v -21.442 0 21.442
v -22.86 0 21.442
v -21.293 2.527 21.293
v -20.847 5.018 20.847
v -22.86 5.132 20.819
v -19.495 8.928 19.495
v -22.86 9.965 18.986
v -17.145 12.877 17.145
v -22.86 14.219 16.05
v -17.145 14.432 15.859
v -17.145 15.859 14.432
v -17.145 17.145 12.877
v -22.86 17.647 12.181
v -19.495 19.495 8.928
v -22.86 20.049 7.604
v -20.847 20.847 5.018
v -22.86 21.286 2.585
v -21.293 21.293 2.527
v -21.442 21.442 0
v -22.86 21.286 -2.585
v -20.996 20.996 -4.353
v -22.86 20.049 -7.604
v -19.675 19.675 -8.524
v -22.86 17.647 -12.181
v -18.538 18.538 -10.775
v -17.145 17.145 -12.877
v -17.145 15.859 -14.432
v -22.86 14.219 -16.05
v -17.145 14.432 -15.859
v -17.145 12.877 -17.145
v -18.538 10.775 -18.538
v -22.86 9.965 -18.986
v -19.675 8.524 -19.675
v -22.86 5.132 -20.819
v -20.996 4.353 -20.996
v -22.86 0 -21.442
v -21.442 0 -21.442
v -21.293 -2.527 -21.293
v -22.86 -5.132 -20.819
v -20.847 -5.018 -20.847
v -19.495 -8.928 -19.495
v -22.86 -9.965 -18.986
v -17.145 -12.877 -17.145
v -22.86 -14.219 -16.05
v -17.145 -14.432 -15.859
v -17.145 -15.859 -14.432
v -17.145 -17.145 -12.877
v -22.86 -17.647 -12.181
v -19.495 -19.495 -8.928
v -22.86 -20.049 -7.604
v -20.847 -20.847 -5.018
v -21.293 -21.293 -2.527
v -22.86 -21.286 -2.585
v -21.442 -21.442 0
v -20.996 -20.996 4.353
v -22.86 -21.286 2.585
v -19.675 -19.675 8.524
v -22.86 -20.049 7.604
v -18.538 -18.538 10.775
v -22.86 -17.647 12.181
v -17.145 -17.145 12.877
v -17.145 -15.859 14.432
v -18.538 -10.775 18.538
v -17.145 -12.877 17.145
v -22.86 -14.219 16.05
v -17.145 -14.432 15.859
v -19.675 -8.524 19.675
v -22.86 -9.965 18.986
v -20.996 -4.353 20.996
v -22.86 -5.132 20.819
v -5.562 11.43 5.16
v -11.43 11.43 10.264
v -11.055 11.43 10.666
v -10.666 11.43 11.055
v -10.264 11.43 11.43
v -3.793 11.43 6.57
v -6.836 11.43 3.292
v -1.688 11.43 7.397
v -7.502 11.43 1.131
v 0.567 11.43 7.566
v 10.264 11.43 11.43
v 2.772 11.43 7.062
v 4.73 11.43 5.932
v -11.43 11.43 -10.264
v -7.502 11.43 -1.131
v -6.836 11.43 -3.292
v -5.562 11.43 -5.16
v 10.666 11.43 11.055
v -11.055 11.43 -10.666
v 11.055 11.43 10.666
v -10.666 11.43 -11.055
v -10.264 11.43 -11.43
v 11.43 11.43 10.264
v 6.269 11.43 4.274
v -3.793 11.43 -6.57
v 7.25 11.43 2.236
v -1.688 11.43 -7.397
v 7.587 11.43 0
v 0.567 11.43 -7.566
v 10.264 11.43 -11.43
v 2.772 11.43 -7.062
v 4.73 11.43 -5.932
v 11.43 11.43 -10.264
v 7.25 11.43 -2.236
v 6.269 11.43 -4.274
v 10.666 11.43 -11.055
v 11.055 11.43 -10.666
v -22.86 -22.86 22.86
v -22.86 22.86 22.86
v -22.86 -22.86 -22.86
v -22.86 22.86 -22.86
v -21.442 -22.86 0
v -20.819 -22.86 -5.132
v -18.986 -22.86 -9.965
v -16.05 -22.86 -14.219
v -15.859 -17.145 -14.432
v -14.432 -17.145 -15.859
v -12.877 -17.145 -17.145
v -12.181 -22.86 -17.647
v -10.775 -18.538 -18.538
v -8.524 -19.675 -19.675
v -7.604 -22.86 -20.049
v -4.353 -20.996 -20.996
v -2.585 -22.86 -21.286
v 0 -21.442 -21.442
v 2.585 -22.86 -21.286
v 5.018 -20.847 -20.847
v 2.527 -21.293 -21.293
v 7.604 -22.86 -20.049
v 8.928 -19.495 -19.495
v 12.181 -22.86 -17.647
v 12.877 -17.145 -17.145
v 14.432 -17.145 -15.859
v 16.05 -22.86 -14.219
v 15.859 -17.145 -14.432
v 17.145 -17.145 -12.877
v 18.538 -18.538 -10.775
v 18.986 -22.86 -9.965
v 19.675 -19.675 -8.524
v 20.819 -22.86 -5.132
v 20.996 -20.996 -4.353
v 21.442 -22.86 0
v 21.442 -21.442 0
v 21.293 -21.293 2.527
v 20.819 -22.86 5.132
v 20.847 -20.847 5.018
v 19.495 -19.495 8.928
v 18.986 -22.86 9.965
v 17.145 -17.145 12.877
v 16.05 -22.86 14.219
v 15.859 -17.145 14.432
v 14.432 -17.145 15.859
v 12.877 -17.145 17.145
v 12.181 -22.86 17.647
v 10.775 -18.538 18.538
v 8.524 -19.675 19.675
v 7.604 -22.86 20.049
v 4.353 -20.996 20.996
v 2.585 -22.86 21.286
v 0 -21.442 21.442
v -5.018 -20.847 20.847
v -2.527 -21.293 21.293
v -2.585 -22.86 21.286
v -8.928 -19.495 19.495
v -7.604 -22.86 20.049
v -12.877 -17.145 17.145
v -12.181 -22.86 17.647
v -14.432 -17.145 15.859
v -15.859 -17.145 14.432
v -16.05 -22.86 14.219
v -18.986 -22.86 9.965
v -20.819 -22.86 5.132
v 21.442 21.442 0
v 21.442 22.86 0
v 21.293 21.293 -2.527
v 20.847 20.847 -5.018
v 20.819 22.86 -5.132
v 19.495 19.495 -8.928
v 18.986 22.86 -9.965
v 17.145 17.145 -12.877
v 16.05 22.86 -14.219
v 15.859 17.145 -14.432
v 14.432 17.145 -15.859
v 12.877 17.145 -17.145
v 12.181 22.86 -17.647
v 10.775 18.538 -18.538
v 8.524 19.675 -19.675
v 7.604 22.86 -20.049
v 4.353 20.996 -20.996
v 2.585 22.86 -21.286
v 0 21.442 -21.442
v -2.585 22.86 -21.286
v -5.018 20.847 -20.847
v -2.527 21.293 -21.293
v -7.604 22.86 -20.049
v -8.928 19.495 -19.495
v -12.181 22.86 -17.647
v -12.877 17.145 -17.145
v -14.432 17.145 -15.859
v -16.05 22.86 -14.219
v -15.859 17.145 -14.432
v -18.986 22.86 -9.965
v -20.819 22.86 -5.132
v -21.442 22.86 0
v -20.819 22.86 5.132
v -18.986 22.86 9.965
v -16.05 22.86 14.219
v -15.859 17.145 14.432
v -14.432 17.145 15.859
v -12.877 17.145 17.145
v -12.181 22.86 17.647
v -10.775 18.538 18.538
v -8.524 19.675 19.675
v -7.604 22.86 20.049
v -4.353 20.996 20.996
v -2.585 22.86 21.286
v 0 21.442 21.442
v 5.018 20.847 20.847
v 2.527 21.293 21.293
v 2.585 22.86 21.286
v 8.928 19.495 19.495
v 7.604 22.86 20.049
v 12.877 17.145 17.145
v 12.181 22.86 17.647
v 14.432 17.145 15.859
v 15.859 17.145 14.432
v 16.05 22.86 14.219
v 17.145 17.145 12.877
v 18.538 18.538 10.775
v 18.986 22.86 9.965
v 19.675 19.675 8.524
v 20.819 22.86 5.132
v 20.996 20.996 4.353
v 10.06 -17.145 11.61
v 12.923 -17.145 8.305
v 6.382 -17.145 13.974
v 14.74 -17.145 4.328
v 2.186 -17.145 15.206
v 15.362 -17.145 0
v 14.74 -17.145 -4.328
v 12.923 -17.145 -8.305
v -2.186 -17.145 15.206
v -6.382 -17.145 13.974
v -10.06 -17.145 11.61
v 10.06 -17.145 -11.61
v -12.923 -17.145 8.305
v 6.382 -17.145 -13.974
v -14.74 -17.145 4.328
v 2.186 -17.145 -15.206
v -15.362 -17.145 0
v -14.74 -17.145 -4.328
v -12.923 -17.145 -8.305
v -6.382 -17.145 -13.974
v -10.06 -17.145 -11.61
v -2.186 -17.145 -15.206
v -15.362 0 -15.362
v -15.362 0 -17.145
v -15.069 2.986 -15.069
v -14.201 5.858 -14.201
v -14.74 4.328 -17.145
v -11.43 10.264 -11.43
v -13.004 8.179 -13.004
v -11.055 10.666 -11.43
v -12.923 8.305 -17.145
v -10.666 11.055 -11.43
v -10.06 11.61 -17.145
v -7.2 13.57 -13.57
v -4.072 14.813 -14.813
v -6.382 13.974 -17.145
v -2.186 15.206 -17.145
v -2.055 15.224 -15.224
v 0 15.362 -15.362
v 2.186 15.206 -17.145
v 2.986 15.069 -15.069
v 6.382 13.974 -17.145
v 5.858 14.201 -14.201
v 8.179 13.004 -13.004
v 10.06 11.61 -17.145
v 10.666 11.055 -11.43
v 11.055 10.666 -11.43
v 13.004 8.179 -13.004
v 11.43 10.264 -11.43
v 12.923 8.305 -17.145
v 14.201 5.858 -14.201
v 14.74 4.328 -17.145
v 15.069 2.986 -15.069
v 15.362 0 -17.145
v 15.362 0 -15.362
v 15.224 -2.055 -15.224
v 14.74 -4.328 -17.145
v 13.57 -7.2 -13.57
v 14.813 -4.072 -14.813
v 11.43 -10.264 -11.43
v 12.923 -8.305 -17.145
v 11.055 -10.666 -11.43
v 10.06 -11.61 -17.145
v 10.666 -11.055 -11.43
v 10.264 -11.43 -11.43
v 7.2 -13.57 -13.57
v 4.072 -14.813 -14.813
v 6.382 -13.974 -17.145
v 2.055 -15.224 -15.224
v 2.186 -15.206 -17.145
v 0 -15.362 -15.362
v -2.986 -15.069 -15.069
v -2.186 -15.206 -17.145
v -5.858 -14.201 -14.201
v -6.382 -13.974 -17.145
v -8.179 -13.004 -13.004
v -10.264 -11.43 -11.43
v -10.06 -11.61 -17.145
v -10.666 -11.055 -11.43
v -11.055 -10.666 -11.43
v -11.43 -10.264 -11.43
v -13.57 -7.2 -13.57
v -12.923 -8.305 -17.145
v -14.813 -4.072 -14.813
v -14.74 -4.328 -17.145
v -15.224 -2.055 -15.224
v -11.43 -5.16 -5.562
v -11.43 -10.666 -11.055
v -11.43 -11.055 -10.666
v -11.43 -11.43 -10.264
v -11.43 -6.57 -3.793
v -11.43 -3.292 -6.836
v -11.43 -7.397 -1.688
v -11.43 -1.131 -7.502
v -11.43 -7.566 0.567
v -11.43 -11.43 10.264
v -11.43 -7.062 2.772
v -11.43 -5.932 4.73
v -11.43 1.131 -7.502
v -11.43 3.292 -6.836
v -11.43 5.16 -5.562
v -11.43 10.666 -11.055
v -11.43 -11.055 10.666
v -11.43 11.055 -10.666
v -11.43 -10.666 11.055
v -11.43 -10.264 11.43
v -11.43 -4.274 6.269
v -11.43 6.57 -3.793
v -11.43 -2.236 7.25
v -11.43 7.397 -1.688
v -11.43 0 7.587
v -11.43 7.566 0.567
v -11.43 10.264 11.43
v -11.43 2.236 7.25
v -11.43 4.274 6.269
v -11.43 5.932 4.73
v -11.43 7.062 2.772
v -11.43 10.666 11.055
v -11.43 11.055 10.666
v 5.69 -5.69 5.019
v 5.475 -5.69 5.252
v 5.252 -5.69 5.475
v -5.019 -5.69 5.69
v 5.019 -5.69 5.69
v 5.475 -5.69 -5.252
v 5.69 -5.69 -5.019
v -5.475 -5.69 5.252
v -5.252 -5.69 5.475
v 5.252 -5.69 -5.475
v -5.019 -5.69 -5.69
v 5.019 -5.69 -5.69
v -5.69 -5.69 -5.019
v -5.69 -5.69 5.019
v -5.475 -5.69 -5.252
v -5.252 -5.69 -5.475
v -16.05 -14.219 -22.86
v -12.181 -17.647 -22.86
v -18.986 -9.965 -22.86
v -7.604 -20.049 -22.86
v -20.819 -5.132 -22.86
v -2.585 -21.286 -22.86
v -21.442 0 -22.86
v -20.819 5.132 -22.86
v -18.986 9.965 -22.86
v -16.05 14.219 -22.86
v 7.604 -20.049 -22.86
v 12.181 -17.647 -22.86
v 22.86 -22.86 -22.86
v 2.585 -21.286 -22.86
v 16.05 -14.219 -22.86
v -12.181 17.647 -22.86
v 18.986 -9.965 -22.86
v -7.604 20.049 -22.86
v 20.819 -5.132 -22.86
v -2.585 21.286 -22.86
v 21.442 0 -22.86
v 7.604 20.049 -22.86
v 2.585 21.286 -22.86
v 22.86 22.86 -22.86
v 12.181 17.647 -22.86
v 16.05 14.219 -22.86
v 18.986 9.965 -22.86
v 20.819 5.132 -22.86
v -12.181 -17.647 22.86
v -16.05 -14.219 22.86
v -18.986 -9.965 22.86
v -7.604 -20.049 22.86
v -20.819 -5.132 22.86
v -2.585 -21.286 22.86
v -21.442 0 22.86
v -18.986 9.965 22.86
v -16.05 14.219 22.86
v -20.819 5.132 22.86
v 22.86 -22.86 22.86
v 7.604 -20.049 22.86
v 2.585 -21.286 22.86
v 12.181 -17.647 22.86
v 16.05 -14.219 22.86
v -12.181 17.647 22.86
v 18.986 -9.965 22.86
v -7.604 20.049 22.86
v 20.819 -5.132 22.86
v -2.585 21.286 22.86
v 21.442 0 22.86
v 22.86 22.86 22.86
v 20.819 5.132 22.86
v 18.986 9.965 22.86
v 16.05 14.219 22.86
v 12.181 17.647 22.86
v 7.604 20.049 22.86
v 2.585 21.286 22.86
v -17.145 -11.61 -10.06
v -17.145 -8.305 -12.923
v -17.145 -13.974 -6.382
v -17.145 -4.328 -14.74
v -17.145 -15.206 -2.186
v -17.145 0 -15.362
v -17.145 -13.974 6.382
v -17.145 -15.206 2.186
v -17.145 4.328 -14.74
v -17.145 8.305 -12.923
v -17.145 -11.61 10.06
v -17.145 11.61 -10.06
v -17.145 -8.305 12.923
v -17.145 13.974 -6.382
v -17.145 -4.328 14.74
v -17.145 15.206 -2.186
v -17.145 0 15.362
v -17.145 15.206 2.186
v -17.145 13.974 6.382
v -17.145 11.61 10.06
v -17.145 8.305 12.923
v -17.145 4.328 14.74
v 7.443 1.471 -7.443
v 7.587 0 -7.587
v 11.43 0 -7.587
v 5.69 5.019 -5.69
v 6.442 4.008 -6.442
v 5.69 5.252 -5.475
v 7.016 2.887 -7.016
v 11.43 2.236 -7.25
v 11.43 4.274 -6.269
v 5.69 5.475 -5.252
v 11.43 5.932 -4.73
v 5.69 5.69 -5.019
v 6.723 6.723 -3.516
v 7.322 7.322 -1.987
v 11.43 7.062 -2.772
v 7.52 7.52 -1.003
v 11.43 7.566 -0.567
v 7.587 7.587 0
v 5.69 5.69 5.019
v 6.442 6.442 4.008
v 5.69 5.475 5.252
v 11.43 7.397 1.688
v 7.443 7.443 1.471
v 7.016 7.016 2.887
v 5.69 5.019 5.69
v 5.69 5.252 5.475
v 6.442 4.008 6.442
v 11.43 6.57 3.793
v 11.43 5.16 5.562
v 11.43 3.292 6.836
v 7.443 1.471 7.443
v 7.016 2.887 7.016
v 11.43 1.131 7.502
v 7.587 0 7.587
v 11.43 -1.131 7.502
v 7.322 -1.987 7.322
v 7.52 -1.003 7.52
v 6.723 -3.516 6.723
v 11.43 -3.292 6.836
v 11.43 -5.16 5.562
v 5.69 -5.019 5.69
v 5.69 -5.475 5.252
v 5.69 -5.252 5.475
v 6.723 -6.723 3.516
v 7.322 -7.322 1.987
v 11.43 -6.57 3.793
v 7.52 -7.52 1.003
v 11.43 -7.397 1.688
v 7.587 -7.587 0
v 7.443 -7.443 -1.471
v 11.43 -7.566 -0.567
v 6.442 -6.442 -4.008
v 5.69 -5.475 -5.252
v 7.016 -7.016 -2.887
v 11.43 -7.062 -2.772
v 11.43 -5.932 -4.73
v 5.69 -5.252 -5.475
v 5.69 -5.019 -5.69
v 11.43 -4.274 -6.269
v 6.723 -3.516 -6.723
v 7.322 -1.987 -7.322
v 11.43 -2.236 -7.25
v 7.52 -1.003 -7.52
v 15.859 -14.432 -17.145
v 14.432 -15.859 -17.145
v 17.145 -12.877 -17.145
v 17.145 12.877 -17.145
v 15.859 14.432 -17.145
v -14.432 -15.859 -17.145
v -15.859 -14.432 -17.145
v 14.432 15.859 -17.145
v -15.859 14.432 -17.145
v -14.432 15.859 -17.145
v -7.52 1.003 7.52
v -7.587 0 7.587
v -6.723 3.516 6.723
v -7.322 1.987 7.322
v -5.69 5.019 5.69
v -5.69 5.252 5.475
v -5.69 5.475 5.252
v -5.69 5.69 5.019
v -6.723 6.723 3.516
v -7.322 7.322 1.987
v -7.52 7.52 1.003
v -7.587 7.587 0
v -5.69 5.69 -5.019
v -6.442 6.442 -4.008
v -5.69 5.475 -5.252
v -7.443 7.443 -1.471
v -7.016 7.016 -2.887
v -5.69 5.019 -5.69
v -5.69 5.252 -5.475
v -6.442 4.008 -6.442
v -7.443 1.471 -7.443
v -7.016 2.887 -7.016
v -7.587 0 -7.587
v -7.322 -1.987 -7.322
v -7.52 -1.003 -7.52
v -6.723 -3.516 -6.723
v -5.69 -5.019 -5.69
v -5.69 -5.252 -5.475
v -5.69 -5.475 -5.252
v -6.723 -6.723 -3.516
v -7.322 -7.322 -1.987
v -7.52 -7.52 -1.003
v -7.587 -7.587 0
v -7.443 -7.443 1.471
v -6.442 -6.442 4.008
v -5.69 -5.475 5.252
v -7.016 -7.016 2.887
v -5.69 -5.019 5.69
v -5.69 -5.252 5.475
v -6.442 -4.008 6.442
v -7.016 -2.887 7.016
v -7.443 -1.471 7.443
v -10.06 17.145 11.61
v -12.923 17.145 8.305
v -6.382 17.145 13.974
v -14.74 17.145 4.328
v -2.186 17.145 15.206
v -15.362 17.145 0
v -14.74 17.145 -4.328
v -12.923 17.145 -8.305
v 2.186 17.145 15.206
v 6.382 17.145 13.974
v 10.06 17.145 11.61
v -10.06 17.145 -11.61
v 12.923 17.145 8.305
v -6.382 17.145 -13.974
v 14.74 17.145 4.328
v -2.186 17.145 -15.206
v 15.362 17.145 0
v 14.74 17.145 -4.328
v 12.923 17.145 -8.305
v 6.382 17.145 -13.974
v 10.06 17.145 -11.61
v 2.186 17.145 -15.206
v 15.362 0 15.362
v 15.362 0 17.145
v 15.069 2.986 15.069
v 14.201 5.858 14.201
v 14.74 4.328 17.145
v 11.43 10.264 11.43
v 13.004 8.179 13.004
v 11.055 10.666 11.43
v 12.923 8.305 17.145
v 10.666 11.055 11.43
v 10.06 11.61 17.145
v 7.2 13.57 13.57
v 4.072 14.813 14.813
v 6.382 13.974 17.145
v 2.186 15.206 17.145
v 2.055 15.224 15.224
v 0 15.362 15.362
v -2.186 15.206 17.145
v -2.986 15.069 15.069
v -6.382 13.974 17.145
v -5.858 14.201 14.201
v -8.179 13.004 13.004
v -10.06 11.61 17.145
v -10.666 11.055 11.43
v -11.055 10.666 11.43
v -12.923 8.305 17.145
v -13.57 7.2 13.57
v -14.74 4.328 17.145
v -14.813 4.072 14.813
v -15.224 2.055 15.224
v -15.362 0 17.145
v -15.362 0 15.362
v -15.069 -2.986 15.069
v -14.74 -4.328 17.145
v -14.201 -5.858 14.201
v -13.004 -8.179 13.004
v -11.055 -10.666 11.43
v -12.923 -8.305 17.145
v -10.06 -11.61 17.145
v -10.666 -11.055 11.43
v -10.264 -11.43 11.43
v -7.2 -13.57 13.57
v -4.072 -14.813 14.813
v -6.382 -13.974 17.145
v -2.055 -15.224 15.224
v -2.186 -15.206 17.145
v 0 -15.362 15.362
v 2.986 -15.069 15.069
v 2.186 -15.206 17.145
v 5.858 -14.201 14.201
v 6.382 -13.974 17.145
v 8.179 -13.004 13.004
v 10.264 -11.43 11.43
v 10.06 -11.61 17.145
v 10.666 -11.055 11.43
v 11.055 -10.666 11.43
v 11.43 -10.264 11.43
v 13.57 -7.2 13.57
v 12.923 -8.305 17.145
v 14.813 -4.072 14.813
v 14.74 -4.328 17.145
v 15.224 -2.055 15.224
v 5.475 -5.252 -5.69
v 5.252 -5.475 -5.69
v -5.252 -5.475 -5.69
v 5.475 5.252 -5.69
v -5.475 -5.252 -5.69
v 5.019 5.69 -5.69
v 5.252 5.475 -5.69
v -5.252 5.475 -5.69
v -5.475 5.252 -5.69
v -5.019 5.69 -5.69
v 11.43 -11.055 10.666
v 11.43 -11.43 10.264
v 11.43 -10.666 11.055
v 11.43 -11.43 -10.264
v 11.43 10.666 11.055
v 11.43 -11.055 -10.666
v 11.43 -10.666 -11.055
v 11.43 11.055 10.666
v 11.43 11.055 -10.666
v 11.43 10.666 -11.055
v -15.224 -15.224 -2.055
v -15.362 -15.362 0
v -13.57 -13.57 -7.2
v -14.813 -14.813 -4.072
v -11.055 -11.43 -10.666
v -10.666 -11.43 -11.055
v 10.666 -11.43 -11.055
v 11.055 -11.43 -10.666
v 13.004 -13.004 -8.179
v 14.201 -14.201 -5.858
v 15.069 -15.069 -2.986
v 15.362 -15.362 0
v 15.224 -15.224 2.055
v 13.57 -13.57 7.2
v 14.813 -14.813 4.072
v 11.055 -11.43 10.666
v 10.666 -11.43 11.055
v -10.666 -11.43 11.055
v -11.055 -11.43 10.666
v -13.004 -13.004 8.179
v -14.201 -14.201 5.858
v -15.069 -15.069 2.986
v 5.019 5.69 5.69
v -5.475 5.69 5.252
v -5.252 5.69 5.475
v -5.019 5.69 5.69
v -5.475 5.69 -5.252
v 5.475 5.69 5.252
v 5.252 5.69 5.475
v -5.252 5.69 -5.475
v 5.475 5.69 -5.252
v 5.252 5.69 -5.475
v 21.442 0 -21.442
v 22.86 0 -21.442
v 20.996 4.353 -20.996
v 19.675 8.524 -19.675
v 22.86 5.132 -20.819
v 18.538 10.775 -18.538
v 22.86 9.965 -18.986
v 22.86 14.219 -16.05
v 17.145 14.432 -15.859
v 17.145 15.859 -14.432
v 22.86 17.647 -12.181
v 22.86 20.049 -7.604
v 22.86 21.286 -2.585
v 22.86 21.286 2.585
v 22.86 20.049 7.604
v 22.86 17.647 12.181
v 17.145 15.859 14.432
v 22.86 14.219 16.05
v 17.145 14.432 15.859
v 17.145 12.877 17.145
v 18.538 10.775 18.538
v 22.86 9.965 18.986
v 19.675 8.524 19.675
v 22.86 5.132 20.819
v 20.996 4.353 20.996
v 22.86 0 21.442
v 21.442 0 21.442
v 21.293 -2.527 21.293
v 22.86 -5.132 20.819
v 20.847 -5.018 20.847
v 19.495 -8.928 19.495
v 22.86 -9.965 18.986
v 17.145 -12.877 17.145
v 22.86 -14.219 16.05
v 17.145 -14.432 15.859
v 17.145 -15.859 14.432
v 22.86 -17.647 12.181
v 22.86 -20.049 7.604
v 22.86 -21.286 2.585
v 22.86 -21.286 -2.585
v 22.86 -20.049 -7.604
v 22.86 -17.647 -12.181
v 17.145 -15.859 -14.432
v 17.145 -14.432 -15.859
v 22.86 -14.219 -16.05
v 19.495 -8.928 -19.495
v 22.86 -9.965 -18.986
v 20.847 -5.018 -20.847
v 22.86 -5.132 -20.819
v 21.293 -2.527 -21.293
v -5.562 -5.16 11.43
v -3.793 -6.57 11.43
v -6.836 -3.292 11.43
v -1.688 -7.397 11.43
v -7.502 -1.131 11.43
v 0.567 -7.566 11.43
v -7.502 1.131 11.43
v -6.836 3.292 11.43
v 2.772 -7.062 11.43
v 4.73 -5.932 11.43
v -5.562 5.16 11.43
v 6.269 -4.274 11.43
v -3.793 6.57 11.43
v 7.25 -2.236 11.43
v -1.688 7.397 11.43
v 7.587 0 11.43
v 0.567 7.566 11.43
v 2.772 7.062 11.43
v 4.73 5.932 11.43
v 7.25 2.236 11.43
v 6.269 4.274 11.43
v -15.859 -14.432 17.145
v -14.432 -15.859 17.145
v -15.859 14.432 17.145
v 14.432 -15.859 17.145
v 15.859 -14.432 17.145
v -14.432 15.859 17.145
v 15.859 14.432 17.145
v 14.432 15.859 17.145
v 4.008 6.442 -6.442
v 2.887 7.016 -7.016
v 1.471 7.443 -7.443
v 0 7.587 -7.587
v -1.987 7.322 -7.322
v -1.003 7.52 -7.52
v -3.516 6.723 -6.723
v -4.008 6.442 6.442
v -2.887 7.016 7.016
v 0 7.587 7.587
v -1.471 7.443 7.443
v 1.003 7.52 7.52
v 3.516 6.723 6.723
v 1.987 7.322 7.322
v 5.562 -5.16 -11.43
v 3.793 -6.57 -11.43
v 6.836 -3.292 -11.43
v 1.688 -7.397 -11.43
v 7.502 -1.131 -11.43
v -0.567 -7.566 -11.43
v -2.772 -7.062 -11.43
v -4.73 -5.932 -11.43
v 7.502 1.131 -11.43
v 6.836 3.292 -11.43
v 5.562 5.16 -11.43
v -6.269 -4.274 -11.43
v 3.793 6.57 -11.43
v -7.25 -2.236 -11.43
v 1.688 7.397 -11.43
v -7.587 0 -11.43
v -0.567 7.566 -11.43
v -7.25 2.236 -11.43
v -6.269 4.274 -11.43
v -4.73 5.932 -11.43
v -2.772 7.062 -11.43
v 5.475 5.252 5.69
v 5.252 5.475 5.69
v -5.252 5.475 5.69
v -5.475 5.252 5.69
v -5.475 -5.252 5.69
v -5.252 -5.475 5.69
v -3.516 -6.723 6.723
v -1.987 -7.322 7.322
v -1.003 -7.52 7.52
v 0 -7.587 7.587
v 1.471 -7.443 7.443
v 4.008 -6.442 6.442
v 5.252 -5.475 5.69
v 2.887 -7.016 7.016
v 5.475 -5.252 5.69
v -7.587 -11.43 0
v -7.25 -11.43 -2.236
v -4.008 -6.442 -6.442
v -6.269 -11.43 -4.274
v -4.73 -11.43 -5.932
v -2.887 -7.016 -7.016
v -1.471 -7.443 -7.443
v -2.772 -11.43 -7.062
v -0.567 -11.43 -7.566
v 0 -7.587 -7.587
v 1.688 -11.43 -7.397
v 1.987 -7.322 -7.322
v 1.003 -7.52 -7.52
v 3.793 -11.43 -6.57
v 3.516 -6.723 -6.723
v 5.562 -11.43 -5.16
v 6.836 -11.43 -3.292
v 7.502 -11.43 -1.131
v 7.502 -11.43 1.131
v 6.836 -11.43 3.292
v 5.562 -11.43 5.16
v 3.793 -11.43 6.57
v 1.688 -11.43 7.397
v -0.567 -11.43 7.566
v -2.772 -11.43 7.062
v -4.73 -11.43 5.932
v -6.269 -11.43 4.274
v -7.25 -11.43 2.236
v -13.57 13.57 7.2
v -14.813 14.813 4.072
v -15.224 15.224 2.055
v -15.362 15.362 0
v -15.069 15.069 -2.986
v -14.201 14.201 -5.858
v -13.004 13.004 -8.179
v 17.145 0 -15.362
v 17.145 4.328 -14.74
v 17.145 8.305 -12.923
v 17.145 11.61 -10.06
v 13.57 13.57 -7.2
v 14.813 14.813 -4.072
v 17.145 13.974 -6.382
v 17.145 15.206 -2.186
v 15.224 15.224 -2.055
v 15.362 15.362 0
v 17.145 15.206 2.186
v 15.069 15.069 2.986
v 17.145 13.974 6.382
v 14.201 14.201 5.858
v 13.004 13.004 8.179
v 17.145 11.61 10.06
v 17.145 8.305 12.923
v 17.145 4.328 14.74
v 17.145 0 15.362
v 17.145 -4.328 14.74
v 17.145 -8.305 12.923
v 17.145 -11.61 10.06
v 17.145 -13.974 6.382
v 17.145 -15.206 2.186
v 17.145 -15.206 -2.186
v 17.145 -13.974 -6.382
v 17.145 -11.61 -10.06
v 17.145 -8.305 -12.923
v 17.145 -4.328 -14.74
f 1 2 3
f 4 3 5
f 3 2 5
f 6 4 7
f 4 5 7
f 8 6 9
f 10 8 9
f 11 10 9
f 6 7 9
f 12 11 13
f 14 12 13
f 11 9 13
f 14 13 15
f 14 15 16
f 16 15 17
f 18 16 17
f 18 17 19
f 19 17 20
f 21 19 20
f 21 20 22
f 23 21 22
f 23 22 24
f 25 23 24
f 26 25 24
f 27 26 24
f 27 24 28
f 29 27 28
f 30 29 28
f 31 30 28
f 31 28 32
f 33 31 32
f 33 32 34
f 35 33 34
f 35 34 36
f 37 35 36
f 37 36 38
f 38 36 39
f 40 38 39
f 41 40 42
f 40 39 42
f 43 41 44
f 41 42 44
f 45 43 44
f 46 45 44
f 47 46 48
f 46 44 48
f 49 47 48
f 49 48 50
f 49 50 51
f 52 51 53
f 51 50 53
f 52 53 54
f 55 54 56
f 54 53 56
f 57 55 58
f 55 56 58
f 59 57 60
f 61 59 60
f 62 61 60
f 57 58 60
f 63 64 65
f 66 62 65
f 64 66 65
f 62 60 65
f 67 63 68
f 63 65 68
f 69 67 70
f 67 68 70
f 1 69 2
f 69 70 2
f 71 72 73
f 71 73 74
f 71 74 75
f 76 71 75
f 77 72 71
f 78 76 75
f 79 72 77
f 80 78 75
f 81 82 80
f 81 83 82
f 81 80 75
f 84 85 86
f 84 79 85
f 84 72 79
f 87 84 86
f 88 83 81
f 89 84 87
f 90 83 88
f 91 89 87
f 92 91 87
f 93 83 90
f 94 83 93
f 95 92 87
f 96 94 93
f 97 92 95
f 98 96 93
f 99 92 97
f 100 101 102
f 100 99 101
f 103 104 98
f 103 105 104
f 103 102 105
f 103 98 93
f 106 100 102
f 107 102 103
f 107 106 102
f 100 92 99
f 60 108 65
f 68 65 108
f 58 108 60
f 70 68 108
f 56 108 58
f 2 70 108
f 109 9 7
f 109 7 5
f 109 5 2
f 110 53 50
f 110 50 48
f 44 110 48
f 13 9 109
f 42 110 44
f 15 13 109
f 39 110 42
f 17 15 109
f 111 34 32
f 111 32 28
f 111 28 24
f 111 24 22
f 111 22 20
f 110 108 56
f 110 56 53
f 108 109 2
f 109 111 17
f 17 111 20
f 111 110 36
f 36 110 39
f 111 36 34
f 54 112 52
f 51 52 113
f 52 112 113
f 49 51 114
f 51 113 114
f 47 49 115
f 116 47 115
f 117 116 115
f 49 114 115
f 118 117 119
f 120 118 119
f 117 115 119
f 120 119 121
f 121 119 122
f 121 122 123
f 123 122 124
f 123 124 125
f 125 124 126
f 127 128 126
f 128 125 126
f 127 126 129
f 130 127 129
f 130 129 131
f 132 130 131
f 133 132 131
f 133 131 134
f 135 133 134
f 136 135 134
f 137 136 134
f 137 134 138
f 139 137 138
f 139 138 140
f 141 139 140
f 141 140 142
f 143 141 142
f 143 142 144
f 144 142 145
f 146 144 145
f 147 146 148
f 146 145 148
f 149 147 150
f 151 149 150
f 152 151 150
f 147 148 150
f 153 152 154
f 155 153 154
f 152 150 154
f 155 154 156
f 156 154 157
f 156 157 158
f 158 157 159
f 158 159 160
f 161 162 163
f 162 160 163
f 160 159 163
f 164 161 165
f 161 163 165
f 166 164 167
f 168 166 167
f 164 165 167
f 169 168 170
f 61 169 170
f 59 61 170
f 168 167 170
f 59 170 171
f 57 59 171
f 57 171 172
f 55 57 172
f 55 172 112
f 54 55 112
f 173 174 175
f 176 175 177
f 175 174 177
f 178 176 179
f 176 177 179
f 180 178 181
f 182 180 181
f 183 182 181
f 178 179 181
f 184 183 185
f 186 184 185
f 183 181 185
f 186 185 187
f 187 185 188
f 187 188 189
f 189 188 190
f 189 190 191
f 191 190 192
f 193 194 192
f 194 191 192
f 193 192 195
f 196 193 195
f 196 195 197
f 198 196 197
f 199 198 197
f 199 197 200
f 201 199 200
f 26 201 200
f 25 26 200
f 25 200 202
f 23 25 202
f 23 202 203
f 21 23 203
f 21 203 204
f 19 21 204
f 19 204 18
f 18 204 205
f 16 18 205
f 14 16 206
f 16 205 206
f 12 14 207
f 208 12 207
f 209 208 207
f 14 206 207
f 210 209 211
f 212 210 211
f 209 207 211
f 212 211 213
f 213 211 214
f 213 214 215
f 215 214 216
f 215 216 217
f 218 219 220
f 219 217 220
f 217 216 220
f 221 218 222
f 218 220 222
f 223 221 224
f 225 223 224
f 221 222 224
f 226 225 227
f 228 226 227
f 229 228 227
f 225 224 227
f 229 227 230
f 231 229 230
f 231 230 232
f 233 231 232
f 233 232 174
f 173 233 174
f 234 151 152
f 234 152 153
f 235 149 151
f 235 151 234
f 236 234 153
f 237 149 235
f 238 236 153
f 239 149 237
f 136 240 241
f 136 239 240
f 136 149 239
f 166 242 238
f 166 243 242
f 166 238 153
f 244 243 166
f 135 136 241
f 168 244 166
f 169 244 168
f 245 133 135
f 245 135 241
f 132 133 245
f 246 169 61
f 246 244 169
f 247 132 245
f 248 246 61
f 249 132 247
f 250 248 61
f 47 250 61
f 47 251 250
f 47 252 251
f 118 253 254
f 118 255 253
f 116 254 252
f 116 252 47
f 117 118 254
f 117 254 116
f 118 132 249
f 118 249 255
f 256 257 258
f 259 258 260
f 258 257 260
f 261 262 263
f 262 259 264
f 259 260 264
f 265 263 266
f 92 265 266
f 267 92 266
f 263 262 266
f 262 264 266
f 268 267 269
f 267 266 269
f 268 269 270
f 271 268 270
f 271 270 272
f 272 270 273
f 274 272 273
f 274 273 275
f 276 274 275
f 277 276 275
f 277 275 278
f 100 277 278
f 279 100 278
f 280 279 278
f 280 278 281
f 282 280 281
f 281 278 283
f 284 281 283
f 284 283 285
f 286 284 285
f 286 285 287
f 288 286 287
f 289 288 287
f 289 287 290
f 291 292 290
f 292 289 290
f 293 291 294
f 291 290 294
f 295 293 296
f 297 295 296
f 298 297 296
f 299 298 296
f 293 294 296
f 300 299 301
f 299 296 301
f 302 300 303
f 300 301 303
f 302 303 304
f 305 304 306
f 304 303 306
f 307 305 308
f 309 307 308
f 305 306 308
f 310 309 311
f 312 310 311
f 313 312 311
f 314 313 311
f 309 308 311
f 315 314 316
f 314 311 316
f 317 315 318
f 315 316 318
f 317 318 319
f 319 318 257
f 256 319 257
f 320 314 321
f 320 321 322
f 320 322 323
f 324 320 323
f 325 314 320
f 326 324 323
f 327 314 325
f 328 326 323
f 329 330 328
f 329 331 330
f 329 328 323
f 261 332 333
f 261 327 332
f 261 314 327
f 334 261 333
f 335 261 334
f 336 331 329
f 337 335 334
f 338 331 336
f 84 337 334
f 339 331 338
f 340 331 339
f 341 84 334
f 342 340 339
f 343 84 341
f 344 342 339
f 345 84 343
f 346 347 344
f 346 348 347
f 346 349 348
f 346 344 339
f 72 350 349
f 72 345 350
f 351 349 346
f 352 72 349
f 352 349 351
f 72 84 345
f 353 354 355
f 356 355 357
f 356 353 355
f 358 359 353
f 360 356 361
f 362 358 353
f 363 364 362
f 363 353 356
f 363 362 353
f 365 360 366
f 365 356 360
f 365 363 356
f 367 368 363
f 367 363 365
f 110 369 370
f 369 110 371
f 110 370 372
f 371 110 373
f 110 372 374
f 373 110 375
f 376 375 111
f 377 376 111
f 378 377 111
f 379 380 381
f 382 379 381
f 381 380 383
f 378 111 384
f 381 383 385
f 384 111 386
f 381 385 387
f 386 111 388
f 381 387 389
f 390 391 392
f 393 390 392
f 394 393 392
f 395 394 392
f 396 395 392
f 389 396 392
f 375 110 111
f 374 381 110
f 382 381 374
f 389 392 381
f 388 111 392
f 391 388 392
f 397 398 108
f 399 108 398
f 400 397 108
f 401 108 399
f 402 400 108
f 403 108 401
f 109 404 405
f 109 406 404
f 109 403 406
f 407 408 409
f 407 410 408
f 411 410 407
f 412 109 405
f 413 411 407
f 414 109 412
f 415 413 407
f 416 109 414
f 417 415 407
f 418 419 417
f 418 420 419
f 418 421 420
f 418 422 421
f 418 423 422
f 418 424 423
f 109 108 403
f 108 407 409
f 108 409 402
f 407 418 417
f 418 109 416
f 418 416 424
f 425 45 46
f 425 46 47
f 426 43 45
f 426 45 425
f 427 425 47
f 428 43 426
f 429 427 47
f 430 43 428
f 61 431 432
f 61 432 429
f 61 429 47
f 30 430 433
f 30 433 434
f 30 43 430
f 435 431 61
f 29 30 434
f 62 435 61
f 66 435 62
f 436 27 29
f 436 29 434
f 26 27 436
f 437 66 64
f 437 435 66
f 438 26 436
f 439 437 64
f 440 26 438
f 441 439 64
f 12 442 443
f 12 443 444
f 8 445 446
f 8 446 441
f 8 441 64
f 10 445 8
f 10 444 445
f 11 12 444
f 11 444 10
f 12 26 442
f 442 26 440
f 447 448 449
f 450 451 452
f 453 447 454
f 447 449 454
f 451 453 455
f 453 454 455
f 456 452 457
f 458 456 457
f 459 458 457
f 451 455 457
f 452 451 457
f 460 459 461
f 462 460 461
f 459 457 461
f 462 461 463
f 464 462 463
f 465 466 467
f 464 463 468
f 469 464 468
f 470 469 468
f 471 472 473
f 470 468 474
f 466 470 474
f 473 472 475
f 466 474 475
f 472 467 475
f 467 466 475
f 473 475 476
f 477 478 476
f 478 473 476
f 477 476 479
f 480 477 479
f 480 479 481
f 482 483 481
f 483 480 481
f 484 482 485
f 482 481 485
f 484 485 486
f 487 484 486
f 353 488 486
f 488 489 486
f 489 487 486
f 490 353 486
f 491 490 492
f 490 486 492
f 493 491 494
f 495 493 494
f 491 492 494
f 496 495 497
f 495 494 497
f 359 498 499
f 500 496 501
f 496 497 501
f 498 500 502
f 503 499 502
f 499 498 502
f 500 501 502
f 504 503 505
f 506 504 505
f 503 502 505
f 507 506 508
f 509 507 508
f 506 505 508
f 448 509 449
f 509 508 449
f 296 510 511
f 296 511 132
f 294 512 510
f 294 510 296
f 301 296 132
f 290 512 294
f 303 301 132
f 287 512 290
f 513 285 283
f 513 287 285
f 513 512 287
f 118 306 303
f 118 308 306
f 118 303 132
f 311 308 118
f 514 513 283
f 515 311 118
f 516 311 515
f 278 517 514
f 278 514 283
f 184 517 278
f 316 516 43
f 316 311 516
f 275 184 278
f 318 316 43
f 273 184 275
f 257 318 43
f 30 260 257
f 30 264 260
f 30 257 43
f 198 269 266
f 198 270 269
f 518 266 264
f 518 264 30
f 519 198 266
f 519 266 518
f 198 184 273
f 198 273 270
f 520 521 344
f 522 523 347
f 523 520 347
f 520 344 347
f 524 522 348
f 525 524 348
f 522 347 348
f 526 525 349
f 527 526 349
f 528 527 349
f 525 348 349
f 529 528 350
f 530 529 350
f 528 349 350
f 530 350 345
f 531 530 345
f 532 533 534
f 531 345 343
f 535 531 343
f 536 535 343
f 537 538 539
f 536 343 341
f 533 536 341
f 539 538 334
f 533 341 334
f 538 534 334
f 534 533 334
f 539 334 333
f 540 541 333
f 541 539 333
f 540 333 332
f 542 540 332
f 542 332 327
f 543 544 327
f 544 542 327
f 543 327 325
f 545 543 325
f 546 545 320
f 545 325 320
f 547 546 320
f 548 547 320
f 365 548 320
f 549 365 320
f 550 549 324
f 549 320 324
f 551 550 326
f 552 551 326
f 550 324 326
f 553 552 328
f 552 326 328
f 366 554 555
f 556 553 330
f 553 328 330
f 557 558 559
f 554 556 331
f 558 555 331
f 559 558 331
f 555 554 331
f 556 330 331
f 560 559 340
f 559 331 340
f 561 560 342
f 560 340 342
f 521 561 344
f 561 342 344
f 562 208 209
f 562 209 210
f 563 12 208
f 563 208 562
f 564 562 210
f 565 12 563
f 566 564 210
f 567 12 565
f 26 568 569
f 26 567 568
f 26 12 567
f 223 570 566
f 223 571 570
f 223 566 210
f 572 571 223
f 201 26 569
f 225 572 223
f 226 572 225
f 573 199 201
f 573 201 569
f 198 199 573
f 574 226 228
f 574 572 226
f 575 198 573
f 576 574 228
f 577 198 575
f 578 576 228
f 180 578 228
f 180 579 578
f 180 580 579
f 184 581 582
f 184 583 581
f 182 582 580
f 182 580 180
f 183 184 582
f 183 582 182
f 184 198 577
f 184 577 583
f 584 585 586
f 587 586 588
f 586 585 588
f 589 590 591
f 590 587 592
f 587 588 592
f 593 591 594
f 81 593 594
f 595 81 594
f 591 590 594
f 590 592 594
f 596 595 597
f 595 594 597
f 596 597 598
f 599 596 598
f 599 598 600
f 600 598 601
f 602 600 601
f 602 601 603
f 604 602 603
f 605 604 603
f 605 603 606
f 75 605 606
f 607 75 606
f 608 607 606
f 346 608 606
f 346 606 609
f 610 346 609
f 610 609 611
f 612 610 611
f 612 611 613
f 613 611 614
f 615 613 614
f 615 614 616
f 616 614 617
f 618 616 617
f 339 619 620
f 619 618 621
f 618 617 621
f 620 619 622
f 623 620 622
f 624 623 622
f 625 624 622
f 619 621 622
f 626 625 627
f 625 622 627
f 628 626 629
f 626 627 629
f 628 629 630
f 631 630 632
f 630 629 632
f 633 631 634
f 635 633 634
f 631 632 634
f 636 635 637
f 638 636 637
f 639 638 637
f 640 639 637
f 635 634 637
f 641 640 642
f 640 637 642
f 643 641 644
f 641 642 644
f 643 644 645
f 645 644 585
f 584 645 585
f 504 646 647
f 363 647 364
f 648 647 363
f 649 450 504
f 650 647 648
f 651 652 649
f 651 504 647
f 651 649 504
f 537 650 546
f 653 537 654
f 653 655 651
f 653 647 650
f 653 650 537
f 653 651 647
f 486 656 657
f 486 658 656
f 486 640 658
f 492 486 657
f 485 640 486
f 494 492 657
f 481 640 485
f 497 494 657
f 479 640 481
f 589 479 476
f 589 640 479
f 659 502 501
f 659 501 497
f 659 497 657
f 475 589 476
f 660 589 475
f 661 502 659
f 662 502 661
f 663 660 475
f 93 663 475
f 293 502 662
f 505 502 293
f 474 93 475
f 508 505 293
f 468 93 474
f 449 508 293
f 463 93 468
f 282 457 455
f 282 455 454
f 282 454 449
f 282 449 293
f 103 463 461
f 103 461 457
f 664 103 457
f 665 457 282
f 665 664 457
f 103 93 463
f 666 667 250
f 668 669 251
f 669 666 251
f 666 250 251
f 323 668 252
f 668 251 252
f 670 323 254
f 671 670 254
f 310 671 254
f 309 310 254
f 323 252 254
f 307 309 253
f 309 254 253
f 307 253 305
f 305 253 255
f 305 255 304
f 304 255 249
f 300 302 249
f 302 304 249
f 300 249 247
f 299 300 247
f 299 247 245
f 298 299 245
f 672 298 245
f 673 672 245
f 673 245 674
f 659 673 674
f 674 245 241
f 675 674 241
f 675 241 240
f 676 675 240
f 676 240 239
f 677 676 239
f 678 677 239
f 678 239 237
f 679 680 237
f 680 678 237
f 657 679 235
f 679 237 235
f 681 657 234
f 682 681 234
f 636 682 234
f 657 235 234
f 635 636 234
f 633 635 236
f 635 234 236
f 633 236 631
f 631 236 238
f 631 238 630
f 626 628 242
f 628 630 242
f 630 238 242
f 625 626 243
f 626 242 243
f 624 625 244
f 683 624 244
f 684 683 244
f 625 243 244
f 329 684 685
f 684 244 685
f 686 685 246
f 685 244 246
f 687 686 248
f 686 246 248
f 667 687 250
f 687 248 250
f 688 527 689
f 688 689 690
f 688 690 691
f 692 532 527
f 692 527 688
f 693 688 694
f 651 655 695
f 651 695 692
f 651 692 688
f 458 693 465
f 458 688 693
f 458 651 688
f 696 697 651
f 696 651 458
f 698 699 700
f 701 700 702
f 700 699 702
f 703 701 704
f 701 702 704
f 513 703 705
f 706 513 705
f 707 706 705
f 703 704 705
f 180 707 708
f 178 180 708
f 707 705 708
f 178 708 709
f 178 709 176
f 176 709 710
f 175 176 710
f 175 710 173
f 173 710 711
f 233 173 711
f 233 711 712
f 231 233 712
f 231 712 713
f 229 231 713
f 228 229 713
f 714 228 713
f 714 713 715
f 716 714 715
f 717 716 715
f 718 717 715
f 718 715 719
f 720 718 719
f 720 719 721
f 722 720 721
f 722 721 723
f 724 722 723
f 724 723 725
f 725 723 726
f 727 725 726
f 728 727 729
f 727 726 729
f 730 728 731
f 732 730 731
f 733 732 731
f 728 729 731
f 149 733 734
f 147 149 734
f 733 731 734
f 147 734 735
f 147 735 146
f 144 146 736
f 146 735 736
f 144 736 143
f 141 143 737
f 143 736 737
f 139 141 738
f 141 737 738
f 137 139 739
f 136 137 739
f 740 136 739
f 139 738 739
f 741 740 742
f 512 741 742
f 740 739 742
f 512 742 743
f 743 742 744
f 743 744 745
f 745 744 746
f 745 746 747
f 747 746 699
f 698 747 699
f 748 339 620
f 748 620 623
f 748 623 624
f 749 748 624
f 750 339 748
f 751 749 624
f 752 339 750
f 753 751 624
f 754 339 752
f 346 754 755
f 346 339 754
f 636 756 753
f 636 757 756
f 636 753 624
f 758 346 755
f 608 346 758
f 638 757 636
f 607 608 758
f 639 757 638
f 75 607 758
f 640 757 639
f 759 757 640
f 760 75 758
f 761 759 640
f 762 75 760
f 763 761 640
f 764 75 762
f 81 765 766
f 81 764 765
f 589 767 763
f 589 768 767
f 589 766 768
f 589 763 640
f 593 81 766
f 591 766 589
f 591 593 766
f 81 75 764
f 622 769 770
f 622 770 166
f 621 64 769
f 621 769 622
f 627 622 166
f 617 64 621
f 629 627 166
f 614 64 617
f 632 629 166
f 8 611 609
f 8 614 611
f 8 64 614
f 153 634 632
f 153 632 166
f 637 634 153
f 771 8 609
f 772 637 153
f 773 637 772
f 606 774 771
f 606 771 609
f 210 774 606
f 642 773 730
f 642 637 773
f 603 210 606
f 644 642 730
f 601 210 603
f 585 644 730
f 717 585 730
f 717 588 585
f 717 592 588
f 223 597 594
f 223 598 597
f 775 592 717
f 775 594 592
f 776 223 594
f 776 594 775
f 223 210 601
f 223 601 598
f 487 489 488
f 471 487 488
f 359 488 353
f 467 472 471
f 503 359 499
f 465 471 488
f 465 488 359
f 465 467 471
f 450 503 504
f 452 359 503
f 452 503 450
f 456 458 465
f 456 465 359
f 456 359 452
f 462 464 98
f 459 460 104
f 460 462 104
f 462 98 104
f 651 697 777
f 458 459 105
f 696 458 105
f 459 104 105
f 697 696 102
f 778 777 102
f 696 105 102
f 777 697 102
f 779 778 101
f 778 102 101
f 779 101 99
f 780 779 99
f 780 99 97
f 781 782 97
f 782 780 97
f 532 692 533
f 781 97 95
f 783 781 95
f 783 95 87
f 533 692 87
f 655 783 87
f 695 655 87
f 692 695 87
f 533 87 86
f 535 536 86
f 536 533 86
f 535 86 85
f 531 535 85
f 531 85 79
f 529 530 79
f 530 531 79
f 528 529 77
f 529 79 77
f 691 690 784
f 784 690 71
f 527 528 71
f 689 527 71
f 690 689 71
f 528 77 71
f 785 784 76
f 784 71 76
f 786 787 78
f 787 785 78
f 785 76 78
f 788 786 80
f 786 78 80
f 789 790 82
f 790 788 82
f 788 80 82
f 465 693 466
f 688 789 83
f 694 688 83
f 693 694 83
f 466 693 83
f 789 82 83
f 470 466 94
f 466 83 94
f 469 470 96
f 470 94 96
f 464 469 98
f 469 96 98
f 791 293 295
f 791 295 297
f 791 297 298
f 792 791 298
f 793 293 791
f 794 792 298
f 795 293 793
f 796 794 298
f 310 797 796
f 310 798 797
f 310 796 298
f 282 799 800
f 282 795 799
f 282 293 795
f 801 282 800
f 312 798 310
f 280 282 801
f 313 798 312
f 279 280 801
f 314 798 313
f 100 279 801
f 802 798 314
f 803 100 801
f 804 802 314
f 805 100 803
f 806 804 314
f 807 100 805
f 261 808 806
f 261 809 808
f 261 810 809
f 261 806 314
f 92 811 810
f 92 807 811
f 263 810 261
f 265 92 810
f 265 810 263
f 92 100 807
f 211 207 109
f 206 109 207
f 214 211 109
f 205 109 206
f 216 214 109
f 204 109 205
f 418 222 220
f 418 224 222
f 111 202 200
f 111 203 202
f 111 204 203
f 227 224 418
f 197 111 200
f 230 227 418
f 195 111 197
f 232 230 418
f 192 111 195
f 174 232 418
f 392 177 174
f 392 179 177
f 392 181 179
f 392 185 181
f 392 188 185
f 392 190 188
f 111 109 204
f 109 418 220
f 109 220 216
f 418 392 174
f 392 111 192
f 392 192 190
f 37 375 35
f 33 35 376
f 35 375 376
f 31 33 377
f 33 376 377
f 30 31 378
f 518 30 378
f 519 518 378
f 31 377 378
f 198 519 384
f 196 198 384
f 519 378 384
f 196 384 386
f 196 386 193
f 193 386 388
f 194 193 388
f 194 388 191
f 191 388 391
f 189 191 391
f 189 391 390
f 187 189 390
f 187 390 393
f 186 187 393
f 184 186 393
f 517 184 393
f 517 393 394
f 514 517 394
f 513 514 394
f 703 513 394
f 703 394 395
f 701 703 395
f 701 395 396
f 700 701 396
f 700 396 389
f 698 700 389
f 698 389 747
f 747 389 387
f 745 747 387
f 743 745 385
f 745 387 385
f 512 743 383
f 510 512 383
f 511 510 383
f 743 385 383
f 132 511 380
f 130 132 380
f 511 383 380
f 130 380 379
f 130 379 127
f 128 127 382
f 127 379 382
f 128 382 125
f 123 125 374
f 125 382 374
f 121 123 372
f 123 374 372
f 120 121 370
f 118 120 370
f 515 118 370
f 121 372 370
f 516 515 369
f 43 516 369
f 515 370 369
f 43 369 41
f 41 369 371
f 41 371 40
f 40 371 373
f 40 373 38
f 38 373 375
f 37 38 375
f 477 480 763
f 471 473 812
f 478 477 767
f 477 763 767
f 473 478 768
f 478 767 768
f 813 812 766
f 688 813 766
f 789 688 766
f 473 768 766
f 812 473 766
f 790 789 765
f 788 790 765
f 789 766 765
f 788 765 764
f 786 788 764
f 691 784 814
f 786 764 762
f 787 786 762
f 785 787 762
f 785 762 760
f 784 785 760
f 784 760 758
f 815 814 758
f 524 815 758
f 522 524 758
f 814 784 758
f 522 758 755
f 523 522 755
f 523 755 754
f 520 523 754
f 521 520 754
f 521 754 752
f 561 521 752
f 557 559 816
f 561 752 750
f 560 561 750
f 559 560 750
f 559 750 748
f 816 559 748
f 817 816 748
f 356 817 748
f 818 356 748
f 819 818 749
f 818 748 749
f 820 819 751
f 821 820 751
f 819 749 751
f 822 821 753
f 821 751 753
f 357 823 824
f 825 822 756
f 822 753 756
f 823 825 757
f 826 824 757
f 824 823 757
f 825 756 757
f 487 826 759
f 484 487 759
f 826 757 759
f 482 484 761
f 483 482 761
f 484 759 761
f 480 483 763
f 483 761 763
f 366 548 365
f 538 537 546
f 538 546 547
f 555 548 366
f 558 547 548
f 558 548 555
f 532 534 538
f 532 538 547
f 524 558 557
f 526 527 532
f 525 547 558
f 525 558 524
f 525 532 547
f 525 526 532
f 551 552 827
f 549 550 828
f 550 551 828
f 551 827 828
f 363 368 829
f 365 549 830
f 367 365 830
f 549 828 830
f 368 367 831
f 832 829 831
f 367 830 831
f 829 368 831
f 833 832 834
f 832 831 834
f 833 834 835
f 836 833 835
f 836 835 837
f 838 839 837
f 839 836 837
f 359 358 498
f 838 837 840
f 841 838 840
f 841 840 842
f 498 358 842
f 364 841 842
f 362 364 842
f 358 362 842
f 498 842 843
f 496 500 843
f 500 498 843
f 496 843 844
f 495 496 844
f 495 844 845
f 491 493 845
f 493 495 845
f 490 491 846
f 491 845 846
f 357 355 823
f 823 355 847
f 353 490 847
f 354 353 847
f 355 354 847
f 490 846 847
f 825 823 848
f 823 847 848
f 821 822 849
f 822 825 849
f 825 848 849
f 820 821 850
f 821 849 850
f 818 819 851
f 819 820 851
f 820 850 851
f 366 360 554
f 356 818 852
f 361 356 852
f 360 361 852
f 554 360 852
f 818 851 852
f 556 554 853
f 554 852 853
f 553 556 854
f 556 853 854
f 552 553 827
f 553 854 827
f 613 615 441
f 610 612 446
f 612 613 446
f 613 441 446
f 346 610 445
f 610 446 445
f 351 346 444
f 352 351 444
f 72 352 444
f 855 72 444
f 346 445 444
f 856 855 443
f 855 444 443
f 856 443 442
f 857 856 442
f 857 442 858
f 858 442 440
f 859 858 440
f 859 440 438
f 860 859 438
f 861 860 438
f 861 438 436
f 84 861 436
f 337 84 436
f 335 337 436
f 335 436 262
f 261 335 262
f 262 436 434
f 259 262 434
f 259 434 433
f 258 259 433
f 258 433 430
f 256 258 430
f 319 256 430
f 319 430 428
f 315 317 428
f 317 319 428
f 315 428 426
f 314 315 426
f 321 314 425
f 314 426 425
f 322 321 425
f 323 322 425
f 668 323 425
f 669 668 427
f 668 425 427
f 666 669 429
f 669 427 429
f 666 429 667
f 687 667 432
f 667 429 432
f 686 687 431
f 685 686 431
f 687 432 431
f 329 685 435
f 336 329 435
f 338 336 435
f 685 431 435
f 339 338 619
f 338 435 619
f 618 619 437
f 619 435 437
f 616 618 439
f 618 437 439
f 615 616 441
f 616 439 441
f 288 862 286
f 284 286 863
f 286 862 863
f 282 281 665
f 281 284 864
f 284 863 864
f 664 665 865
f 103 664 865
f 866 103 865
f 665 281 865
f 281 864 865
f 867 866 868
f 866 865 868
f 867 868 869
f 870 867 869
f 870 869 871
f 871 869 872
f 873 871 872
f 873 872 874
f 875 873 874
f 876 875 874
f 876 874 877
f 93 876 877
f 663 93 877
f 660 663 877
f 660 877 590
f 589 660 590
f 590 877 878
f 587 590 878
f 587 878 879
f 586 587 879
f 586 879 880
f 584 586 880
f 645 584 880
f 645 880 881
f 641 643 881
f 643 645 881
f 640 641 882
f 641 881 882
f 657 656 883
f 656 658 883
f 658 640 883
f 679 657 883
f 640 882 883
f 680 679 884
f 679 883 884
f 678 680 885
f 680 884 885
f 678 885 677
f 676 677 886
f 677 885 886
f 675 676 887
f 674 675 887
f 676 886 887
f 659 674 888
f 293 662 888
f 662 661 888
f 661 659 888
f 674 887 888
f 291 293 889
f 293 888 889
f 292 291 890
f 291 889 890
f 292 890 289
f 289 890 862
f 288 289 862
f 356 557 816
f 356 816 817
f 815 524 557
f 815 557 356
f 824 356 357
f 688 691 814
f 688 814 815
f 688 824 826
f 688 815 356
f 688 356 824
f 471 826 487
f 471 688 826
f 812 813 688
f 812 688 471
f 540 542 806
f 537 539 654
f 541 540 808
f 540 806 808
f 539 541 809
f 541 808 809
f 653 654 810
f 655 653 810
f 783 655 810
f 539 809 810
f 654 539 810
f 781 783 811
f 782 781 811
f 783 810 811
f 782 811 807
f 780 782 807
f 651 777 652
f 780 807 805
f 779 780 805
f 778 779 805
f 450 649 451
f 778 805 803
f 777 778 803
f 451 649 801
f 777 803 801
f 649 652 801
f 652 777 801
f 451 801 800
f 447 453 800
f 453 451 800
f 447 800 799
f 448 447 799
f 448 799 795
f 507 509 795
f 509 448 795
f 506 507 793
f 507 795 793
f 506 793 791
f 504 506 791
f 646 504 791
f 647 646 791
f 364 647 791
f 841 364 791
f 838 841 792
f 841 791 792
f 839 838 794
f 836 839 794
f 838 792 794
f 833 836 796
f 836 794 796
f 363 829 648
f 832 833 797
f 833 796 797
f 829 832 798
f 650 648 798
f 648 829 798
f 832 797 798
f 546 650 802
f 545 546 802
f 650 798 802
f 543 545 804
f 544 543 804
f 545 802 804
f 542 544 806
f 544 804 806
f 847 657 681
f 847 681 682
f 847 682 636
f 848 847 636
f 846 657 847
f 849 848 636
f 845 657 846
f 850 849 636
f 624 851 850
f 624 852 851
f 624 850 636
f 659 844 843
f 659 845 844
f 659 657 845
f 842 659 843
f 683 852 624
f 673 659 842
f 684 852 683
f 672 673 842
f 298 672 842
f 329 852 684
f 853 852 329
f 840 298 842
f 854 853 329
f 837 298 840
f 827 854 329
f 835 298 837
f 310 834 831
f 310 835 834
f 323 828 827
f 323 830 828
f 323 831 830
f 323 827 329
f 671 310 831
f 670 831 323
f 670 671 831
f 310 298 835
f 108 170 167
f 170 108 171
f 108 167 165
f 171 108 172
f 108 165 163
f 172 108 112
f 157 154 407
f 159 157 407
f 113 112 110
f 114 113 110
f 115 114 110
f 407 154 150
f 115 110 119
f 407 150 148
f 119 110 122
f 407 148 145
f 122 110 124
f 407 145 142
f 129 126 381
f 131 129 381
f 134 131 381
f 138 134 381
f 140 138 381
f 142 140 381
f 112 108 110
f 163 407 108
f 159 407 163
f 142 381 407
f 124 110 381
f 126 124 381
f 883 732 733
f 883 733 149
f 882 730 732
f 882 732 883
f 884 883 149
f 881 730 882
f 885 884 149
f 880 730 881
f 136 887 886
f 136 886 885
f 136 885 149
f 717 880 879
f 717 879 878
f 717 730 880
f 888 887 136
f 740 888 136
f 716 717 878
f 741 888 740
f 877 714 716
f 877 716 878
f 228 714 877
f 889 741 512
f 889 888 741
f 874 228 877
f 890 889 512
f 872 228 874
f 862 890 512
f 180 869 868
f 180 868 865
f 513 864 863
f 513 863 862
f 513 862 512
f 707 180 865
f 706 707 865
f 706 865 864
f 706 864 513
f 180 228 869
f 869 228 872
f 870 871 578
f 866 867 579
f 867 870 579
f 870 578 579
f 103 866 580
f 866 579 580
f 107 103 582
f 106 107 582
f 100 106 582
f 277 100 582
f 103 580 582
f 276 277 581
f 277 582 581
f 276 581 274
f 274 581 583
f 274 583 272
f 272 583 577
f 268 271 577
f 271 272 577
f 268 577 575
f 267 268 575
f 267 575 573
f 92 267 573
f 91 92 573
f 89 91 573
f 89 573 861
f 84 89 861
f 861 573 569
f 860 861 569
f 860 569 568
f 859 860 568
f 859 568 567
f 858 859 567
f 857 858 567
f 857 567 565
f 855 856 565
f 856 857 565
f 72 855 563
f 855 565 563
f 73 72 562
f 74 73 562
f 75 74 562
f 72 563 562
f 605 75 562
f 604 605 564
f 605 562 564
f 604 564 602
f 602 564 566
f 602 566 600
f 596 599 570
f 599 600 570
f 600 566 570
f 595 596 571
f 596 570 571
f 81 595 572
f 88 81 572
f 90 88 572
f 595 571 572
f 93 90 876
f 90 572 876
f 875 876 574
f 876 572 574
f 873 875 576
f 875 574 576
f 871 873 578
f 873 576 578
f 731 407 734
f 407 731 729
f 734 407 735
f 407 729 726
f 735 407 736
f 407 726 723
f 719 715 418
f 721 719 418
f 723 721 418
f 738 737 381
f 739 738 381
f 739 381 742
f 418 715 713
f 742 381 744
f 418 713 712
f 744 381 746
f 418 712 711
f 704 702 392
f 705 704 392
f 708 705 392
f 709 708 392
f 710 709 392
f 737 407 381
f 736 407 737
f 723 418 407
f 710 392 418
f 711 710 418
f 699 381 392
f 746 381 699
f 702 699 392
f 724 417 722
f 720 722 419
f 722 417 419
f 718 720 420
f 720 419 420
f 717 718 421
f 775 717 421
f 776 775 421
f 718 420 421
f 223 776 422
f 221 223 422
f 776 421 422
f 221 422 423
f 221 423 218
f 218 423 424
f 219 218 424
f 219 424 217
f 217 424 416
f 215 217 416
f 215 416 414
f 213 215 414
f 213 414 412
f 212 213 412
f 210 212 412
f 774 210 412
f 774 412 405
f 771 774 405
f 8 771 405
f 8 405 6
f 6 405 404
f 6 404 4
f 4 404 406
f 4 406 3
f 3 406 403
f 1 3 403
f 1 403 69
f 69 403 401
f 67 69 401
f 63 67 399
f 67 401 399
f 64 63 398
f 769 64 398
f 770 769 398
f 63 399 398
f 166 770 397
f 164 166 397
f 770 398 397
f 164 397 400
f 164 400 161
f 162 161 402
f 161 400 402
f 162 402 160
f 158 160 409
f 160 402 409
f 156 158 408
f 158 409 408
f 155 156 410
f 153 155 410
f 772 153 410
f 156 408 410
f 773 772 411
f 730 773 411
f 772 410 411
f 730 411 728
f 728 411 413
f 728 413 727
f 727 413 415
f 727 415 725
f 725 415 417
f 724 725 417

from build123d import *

# Parameters (mm, degrees)
BOSS_EXTRUDE1_DEPTH          = 22.86
BOSS_EXTRUDE1_DEPTH_BACK     = 22.86
SKETCH1_W                    = 45.72
SKETCH1_H                    = 45.72
SKETCH4_R                    = 7.586926628
CUT_EXTRUDE1_DEPTH           = 17.1704
SKETCH5_R                    = 21.442420376
CUT_EXTRUDE2_DEPTH           = 5.715
SKETCH6_R                    = 15.362111806
CUT_EXTRUDE3_DEPTH           = 11.43
CIRPATTERN1_COUNT            = 4
CIRPATTERN2_COPY_1_SKETCH_R  = 7.586926628
CIRPATTERN2_COPY_1_DEPTH     = 17.1704
CIRPATTERN2_COPY_2_SKETCH_R  = 7.586926628
CIRPATTERN2_COPY_2_DEPTH     = 17.1704
CIRPATTERN2_COPY_3_SKETCH_R  = 7.586926628
CIRPATTERN2_COPY_3_DEPTH     = 17.1704
CIRPATTERN2_COPY_4_SKETCH_R  = 21.442420376
CIRPATTERN2_COPY_4_DEPTH     = 5.715
CIRPATTERN2_COPY_5_SKETCH_R  = 21.442420376
CIRPATTERN2_COPY_5_DEPTH     = 5.715
CIRPATTERN2_COPY_6_SKETCH_R  = 21.442420376
CIRPATTERN2_COPY_6_DEPTH     = 5.715
CIRPATTERN2_COPY_7_SKETCH_R  = 15.362111806
CIRPATTERN2_COPY_7_DEPTH     = 11.43
CIRPATTERN2_COPY_8_SKETCH_R  = 15.362111806
CIRPATTERN2_COPY_8_DEPTH     = 11.43
CIRPATTERN2_COPY_9_SKETCH_R  = 15.362111806
CIRPATTERN2_COPY_9_DEPTH     = 11.43
CIRPATTERN2_COPY_10_SKETCH_R = 7.586926628
CIRPATTERN2_COPY_10_DEPTH    = 17.1704
CIRPATTERN2_COPY_11_SKETCH_R = 21.442420376
CIRPATTERN2_COPY_11_DEPTH    = 5.715
CIRPATTERN2_COPY_12_SKETCH_R = 15.362111806
CIRPATTERN2_COPY_12_DEPTH    = 11.43


with BuildPart() as part:
    # Sketch1 → Boss-Extrude1 (new, two sides: drawn at the far end of the back side and taken through both)
    with BuildSketch(Plane.XY.offset(-BOSS_EXTRUDE1_DEPTH_BACK)):
        Rectangle(SKETCH1_W, SKETCH1_H)
    extrude(amount=BOSS_EXTRUDE1_DEPTH + BOSS_EXTRUDE1_DEPTH_BACK)

    # Sketch4 → Cut-Extrude1 (cut)
    with BuildSketch(Plane.XY.offset(22.86)):
        Circle(SKETCH4_R)
    cut_extrude1 = extrude(amount=-CUT_EXTRUDE1_DEPTH, mode=Mode.SUBTRACT)

    # Sketch5 → Cut-Extrude2 (cut)
    with BuildSketch(Plane.XY.offset(22.86)):
        Circle(SKETCH5_R)
    cut_extrude2 = extrude(amount=-CUT_EXTRUDE2_DEPTH, mode=Mode.SUBTRACT)

    # Sketch6 → Cut-Extrude3 (cut)
    with BuildSketch(Plane.XY.offset(22.86)):
        Circle(SKETCH6_R)
    cut_extrude3 = extrude(amount=-CUT_EXTRUDE3_DEPTH, mode=Mode.SUBTRACT)

    # CirPattern1: Cut-Extrude1, Cut-Extrude2, Cut-Extrude3 ×4 about axis
    cirpattern1_axis = Axis((0, -25.146, 0), (0, 1, 0))
    add([cut_extrude1.rotate(cirpattern1_axis, i * 360 / CIRPATTERN1_COUNT) for i in range(1, CIRPATTERN1_COUNT)], mode=Mode.SUBTRACT)
    add([cut_extrude2.rotate(cirpattern1_axis, i * 360 / CIRPATTERN1_COUNT) for i in range(1, CIRPATTERN1_COUNT)], mode=Mode.SUBTRACT)
    add([cut_extrude3.rotate(cirpattern1_axis, i * 360 / CIRPATTERN1_COUNT) for i in range(1, CIRPATTERN1_COUNT)], mode=Mode.SUBTRACT)

    # CirPattern2 copy 1 sketch → CirPattern2 copy 1 (cut)
    with BuildSketch(Plane(origin=(22.86, 0, 0), x_dir=(0, -1, 0), z_dir=(1, 0, 0))):
        Circle(CIRPATTERN2_COPY_1_SKETCH_R)
    extrude(amount=-CIRPATTERN2_COPY_1_DEPTH, mode=Mode.SUBTRACT)

    # CirPattern2 copy 2 sketch → CirPattern2 copy 2 (cut)
    with BuildSketch(Plane(origin=(0, -22.86, 0), x_dir=(-1, 0, 0), z_dir=(0, -1, 0))):
        Circle(CIRPATTERN2_COPY_2_SKETCH_R)
    extrude(amount=-CIRPATTERN2_COPY_2_DEPTH, mode=Mode.SUBTRACT)

    # CirPattern2 copy 3 sketch → CirPattern2 copy 3 (cut)
    with BuildSketch(Plane(origin=(-22.86, 0, 0), x_dir=(0, 1, 0), z_dir=(-1, 0, 0))):
        Circle(CIRPATTERN2_COPY_3_SKETCH_R)
    extrude(amount=-CIRPATTERN2_COPY_3_DEPTH, mode=Mode.SUBTRACT)

    # CirPattern2 copy 4 sketch → CirPattern2 copy 4 (cut)
    with BuildSketch(Plane(origin=(22.86, 0, 0), x_dir=(0, -1, 0), z_dir=(1, 0, 0))):
        Circle(CIRPATTERN2_COPY_4_SKETCH_R)
    extrude(amount=-CIRPATTERN2_COPY_4_DEPTH, mode=Mode.SUBTRACT)

    # CirPattern2 copy 5 sketch → CirPattern2 copy 5 (cut)
    with BuildSketch(Plane(origin=(0, -22.86, 0), x_dir=(-1, 0, 0), z_dir=(0, -1, 0))):
        Circle(CIRPATTERN2_COPY_5_SKETCH_R)
    extrude(amount=-CIRPATTERN2_COPY_5_DEPTH, mode=Mode.SUBTRACT)

    # CirPattern2 copy 6 sketch → CirPattern2 copy 6 (cut)
    with BuildSketch(Plane(origin=(-22.86, 0, 0), x_dir=(0, 1, 0), z_dir=(-1, 0, 0))):
        Circle(CIRPATTERN2_COPY_6_SKETCH_R)
    extrude(amount=-CIRPATTERN2_COPY_6_DEPTH, mode=Mode.SUBTRACT)

    # CirPattern2 copy 7 sketch → CirPattern2 copy 7 (cut)
    with BuildSketch(Plane(origin=(22.86, 0, 0), x_dir=(0, -1, 0), z_dir=(1, 0, 0))):
        Circle(CIRPATTERN2_COPY_7_SKETCH_R)
    extrude(amount=-CIRPATTERN2_COPY_7_DEPTH, mode=Mode.SUBTRACT)

    # CirPattern2 copy 8 sketch → CirPattern2 copy 8 (cut)
    with BuildSketch(Plane(origin=(0, -22.86, 0), x_dir=(-1, 0, 0), z_dir=(0, -1, 0))):
        Circle(CIRPATTERN2_COPY_8_SKETCH_R)
    extrude(amount=-CIRPATTERN2_COPY_8_DEPTH, mode=Mode.SUBTRACT)

    # CirPattern2 copy 9 sketch → CirPattern2 copy 9 (cut)
    with BuildSketch(Plane(origin=(-22.86, 0, 0), x_dir=(0, 1, 0), z_dir=(-1, 0, 0))):
        Circle(CIRPATTERN2_COPY_9_SKETCH_R)
    extrude(amount=-CIRPATTERN2_COPY_9_DEPTH, mode=Mode.SUBTRACT)

    # CirPattern2 copy 10 sketch → CirPattern2 copy 10 (cut)
    with BuildSketch(Plane(origin=(0, 22.86, 0), x_dir=(1, 0, 0), z_dir=(0, 1, 0))):
        Circle(CIRPATTERN2_COPY_10_SKETCH_R)
    extrude(amount=-CIRPATTERN2_COPY_10_DEPTH, mode=Mode.SUBTRACT)

    # CirPattern2 copy 11 sketch → CirPattern2 copy 11 (cut)
    with BuildSketch(Plane(origin=(0, 22.86, 0), x_dir=(1, 0, 0), z_dir=(0, 1, 0))):
        Circle(CIRPATTERN2_COPY_11_SKETCH_R)
    extrude(amount=-CIRPATTERN2_COPY_11_DEPTH, mode=Mode.SUBTRACT)

    # CirPattern2 copy 12 sketch → CirPattern2 copy 12 (cut)
    with BuildSketch(Plane(origin=(0, 22.86, 0), x_dir=(1, 0, 0), z_dir=(0, 1, 0))):
        Circle(CIRPATTERN2_COPY_12_SKETCH_R)
    extrude(amount=-CIRPATTERN2_COPY_12_DEPTH, mode=Mode.SUBTRACT)


solid = part.part
